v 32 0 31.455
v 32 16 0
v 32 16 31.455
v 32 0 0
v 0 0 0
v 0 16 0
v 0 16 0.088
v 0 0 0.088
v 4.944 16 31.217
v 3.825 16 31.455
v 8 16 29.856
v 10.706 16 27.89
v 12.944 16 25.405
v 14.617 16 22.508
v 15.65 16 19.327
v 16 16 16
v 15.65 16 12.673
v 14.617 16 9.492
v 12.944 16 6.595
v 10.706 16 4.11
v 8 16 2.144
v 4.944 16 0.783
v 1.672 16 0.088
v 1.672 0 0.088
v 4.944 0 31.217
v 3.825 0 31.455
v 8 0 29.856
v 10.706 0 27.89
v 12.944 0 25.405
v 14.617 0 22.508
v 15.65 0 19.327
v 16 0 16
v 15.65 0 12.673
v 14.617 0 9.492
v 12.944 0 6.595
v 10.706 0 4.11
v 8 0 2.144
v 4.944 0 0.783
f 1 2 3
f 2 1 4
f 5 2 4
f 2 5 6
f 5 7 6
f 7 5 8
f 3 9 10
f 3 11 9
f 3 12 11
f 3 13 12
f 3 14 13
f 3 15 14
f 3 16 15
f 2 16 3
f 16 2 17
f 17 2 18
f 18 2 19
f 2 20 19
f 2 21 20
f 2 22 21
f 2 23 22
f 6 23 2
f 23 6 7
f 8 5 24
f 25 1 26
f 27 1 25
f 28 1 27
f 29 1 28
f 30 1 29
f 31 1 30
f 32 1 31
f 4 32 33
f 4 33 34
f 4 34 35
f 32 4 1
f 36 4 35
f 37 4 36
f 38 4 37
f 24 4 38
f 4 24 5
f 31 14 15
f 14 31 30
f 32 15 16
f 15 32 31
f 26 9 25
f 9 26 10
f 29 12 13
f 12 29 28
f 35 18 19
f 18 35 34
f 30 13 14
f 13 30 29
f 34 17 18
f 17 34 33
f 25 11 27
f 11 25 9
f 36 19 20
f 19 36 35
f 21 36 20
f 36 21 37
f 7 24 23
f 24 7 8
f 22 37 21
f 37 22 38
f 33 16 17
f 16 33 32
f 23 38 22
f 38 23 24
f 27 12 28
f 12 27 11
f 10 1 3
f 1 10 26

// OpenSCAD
module diagnose_degree(w, upto) {
	difference() {
		cube([w * 2, w, w * 2]);
		translate([0, w + 1, w])	rotate([90, 0, 0])	cylinder(w  + 2, w, w);
		translate([-1 , -1, w + w * sin(upto)])	cube(1024);
	}
	//translate([0, 0, 0])	cube([w * 2, w, w]);
}
diagnose_degree(16, 75);
